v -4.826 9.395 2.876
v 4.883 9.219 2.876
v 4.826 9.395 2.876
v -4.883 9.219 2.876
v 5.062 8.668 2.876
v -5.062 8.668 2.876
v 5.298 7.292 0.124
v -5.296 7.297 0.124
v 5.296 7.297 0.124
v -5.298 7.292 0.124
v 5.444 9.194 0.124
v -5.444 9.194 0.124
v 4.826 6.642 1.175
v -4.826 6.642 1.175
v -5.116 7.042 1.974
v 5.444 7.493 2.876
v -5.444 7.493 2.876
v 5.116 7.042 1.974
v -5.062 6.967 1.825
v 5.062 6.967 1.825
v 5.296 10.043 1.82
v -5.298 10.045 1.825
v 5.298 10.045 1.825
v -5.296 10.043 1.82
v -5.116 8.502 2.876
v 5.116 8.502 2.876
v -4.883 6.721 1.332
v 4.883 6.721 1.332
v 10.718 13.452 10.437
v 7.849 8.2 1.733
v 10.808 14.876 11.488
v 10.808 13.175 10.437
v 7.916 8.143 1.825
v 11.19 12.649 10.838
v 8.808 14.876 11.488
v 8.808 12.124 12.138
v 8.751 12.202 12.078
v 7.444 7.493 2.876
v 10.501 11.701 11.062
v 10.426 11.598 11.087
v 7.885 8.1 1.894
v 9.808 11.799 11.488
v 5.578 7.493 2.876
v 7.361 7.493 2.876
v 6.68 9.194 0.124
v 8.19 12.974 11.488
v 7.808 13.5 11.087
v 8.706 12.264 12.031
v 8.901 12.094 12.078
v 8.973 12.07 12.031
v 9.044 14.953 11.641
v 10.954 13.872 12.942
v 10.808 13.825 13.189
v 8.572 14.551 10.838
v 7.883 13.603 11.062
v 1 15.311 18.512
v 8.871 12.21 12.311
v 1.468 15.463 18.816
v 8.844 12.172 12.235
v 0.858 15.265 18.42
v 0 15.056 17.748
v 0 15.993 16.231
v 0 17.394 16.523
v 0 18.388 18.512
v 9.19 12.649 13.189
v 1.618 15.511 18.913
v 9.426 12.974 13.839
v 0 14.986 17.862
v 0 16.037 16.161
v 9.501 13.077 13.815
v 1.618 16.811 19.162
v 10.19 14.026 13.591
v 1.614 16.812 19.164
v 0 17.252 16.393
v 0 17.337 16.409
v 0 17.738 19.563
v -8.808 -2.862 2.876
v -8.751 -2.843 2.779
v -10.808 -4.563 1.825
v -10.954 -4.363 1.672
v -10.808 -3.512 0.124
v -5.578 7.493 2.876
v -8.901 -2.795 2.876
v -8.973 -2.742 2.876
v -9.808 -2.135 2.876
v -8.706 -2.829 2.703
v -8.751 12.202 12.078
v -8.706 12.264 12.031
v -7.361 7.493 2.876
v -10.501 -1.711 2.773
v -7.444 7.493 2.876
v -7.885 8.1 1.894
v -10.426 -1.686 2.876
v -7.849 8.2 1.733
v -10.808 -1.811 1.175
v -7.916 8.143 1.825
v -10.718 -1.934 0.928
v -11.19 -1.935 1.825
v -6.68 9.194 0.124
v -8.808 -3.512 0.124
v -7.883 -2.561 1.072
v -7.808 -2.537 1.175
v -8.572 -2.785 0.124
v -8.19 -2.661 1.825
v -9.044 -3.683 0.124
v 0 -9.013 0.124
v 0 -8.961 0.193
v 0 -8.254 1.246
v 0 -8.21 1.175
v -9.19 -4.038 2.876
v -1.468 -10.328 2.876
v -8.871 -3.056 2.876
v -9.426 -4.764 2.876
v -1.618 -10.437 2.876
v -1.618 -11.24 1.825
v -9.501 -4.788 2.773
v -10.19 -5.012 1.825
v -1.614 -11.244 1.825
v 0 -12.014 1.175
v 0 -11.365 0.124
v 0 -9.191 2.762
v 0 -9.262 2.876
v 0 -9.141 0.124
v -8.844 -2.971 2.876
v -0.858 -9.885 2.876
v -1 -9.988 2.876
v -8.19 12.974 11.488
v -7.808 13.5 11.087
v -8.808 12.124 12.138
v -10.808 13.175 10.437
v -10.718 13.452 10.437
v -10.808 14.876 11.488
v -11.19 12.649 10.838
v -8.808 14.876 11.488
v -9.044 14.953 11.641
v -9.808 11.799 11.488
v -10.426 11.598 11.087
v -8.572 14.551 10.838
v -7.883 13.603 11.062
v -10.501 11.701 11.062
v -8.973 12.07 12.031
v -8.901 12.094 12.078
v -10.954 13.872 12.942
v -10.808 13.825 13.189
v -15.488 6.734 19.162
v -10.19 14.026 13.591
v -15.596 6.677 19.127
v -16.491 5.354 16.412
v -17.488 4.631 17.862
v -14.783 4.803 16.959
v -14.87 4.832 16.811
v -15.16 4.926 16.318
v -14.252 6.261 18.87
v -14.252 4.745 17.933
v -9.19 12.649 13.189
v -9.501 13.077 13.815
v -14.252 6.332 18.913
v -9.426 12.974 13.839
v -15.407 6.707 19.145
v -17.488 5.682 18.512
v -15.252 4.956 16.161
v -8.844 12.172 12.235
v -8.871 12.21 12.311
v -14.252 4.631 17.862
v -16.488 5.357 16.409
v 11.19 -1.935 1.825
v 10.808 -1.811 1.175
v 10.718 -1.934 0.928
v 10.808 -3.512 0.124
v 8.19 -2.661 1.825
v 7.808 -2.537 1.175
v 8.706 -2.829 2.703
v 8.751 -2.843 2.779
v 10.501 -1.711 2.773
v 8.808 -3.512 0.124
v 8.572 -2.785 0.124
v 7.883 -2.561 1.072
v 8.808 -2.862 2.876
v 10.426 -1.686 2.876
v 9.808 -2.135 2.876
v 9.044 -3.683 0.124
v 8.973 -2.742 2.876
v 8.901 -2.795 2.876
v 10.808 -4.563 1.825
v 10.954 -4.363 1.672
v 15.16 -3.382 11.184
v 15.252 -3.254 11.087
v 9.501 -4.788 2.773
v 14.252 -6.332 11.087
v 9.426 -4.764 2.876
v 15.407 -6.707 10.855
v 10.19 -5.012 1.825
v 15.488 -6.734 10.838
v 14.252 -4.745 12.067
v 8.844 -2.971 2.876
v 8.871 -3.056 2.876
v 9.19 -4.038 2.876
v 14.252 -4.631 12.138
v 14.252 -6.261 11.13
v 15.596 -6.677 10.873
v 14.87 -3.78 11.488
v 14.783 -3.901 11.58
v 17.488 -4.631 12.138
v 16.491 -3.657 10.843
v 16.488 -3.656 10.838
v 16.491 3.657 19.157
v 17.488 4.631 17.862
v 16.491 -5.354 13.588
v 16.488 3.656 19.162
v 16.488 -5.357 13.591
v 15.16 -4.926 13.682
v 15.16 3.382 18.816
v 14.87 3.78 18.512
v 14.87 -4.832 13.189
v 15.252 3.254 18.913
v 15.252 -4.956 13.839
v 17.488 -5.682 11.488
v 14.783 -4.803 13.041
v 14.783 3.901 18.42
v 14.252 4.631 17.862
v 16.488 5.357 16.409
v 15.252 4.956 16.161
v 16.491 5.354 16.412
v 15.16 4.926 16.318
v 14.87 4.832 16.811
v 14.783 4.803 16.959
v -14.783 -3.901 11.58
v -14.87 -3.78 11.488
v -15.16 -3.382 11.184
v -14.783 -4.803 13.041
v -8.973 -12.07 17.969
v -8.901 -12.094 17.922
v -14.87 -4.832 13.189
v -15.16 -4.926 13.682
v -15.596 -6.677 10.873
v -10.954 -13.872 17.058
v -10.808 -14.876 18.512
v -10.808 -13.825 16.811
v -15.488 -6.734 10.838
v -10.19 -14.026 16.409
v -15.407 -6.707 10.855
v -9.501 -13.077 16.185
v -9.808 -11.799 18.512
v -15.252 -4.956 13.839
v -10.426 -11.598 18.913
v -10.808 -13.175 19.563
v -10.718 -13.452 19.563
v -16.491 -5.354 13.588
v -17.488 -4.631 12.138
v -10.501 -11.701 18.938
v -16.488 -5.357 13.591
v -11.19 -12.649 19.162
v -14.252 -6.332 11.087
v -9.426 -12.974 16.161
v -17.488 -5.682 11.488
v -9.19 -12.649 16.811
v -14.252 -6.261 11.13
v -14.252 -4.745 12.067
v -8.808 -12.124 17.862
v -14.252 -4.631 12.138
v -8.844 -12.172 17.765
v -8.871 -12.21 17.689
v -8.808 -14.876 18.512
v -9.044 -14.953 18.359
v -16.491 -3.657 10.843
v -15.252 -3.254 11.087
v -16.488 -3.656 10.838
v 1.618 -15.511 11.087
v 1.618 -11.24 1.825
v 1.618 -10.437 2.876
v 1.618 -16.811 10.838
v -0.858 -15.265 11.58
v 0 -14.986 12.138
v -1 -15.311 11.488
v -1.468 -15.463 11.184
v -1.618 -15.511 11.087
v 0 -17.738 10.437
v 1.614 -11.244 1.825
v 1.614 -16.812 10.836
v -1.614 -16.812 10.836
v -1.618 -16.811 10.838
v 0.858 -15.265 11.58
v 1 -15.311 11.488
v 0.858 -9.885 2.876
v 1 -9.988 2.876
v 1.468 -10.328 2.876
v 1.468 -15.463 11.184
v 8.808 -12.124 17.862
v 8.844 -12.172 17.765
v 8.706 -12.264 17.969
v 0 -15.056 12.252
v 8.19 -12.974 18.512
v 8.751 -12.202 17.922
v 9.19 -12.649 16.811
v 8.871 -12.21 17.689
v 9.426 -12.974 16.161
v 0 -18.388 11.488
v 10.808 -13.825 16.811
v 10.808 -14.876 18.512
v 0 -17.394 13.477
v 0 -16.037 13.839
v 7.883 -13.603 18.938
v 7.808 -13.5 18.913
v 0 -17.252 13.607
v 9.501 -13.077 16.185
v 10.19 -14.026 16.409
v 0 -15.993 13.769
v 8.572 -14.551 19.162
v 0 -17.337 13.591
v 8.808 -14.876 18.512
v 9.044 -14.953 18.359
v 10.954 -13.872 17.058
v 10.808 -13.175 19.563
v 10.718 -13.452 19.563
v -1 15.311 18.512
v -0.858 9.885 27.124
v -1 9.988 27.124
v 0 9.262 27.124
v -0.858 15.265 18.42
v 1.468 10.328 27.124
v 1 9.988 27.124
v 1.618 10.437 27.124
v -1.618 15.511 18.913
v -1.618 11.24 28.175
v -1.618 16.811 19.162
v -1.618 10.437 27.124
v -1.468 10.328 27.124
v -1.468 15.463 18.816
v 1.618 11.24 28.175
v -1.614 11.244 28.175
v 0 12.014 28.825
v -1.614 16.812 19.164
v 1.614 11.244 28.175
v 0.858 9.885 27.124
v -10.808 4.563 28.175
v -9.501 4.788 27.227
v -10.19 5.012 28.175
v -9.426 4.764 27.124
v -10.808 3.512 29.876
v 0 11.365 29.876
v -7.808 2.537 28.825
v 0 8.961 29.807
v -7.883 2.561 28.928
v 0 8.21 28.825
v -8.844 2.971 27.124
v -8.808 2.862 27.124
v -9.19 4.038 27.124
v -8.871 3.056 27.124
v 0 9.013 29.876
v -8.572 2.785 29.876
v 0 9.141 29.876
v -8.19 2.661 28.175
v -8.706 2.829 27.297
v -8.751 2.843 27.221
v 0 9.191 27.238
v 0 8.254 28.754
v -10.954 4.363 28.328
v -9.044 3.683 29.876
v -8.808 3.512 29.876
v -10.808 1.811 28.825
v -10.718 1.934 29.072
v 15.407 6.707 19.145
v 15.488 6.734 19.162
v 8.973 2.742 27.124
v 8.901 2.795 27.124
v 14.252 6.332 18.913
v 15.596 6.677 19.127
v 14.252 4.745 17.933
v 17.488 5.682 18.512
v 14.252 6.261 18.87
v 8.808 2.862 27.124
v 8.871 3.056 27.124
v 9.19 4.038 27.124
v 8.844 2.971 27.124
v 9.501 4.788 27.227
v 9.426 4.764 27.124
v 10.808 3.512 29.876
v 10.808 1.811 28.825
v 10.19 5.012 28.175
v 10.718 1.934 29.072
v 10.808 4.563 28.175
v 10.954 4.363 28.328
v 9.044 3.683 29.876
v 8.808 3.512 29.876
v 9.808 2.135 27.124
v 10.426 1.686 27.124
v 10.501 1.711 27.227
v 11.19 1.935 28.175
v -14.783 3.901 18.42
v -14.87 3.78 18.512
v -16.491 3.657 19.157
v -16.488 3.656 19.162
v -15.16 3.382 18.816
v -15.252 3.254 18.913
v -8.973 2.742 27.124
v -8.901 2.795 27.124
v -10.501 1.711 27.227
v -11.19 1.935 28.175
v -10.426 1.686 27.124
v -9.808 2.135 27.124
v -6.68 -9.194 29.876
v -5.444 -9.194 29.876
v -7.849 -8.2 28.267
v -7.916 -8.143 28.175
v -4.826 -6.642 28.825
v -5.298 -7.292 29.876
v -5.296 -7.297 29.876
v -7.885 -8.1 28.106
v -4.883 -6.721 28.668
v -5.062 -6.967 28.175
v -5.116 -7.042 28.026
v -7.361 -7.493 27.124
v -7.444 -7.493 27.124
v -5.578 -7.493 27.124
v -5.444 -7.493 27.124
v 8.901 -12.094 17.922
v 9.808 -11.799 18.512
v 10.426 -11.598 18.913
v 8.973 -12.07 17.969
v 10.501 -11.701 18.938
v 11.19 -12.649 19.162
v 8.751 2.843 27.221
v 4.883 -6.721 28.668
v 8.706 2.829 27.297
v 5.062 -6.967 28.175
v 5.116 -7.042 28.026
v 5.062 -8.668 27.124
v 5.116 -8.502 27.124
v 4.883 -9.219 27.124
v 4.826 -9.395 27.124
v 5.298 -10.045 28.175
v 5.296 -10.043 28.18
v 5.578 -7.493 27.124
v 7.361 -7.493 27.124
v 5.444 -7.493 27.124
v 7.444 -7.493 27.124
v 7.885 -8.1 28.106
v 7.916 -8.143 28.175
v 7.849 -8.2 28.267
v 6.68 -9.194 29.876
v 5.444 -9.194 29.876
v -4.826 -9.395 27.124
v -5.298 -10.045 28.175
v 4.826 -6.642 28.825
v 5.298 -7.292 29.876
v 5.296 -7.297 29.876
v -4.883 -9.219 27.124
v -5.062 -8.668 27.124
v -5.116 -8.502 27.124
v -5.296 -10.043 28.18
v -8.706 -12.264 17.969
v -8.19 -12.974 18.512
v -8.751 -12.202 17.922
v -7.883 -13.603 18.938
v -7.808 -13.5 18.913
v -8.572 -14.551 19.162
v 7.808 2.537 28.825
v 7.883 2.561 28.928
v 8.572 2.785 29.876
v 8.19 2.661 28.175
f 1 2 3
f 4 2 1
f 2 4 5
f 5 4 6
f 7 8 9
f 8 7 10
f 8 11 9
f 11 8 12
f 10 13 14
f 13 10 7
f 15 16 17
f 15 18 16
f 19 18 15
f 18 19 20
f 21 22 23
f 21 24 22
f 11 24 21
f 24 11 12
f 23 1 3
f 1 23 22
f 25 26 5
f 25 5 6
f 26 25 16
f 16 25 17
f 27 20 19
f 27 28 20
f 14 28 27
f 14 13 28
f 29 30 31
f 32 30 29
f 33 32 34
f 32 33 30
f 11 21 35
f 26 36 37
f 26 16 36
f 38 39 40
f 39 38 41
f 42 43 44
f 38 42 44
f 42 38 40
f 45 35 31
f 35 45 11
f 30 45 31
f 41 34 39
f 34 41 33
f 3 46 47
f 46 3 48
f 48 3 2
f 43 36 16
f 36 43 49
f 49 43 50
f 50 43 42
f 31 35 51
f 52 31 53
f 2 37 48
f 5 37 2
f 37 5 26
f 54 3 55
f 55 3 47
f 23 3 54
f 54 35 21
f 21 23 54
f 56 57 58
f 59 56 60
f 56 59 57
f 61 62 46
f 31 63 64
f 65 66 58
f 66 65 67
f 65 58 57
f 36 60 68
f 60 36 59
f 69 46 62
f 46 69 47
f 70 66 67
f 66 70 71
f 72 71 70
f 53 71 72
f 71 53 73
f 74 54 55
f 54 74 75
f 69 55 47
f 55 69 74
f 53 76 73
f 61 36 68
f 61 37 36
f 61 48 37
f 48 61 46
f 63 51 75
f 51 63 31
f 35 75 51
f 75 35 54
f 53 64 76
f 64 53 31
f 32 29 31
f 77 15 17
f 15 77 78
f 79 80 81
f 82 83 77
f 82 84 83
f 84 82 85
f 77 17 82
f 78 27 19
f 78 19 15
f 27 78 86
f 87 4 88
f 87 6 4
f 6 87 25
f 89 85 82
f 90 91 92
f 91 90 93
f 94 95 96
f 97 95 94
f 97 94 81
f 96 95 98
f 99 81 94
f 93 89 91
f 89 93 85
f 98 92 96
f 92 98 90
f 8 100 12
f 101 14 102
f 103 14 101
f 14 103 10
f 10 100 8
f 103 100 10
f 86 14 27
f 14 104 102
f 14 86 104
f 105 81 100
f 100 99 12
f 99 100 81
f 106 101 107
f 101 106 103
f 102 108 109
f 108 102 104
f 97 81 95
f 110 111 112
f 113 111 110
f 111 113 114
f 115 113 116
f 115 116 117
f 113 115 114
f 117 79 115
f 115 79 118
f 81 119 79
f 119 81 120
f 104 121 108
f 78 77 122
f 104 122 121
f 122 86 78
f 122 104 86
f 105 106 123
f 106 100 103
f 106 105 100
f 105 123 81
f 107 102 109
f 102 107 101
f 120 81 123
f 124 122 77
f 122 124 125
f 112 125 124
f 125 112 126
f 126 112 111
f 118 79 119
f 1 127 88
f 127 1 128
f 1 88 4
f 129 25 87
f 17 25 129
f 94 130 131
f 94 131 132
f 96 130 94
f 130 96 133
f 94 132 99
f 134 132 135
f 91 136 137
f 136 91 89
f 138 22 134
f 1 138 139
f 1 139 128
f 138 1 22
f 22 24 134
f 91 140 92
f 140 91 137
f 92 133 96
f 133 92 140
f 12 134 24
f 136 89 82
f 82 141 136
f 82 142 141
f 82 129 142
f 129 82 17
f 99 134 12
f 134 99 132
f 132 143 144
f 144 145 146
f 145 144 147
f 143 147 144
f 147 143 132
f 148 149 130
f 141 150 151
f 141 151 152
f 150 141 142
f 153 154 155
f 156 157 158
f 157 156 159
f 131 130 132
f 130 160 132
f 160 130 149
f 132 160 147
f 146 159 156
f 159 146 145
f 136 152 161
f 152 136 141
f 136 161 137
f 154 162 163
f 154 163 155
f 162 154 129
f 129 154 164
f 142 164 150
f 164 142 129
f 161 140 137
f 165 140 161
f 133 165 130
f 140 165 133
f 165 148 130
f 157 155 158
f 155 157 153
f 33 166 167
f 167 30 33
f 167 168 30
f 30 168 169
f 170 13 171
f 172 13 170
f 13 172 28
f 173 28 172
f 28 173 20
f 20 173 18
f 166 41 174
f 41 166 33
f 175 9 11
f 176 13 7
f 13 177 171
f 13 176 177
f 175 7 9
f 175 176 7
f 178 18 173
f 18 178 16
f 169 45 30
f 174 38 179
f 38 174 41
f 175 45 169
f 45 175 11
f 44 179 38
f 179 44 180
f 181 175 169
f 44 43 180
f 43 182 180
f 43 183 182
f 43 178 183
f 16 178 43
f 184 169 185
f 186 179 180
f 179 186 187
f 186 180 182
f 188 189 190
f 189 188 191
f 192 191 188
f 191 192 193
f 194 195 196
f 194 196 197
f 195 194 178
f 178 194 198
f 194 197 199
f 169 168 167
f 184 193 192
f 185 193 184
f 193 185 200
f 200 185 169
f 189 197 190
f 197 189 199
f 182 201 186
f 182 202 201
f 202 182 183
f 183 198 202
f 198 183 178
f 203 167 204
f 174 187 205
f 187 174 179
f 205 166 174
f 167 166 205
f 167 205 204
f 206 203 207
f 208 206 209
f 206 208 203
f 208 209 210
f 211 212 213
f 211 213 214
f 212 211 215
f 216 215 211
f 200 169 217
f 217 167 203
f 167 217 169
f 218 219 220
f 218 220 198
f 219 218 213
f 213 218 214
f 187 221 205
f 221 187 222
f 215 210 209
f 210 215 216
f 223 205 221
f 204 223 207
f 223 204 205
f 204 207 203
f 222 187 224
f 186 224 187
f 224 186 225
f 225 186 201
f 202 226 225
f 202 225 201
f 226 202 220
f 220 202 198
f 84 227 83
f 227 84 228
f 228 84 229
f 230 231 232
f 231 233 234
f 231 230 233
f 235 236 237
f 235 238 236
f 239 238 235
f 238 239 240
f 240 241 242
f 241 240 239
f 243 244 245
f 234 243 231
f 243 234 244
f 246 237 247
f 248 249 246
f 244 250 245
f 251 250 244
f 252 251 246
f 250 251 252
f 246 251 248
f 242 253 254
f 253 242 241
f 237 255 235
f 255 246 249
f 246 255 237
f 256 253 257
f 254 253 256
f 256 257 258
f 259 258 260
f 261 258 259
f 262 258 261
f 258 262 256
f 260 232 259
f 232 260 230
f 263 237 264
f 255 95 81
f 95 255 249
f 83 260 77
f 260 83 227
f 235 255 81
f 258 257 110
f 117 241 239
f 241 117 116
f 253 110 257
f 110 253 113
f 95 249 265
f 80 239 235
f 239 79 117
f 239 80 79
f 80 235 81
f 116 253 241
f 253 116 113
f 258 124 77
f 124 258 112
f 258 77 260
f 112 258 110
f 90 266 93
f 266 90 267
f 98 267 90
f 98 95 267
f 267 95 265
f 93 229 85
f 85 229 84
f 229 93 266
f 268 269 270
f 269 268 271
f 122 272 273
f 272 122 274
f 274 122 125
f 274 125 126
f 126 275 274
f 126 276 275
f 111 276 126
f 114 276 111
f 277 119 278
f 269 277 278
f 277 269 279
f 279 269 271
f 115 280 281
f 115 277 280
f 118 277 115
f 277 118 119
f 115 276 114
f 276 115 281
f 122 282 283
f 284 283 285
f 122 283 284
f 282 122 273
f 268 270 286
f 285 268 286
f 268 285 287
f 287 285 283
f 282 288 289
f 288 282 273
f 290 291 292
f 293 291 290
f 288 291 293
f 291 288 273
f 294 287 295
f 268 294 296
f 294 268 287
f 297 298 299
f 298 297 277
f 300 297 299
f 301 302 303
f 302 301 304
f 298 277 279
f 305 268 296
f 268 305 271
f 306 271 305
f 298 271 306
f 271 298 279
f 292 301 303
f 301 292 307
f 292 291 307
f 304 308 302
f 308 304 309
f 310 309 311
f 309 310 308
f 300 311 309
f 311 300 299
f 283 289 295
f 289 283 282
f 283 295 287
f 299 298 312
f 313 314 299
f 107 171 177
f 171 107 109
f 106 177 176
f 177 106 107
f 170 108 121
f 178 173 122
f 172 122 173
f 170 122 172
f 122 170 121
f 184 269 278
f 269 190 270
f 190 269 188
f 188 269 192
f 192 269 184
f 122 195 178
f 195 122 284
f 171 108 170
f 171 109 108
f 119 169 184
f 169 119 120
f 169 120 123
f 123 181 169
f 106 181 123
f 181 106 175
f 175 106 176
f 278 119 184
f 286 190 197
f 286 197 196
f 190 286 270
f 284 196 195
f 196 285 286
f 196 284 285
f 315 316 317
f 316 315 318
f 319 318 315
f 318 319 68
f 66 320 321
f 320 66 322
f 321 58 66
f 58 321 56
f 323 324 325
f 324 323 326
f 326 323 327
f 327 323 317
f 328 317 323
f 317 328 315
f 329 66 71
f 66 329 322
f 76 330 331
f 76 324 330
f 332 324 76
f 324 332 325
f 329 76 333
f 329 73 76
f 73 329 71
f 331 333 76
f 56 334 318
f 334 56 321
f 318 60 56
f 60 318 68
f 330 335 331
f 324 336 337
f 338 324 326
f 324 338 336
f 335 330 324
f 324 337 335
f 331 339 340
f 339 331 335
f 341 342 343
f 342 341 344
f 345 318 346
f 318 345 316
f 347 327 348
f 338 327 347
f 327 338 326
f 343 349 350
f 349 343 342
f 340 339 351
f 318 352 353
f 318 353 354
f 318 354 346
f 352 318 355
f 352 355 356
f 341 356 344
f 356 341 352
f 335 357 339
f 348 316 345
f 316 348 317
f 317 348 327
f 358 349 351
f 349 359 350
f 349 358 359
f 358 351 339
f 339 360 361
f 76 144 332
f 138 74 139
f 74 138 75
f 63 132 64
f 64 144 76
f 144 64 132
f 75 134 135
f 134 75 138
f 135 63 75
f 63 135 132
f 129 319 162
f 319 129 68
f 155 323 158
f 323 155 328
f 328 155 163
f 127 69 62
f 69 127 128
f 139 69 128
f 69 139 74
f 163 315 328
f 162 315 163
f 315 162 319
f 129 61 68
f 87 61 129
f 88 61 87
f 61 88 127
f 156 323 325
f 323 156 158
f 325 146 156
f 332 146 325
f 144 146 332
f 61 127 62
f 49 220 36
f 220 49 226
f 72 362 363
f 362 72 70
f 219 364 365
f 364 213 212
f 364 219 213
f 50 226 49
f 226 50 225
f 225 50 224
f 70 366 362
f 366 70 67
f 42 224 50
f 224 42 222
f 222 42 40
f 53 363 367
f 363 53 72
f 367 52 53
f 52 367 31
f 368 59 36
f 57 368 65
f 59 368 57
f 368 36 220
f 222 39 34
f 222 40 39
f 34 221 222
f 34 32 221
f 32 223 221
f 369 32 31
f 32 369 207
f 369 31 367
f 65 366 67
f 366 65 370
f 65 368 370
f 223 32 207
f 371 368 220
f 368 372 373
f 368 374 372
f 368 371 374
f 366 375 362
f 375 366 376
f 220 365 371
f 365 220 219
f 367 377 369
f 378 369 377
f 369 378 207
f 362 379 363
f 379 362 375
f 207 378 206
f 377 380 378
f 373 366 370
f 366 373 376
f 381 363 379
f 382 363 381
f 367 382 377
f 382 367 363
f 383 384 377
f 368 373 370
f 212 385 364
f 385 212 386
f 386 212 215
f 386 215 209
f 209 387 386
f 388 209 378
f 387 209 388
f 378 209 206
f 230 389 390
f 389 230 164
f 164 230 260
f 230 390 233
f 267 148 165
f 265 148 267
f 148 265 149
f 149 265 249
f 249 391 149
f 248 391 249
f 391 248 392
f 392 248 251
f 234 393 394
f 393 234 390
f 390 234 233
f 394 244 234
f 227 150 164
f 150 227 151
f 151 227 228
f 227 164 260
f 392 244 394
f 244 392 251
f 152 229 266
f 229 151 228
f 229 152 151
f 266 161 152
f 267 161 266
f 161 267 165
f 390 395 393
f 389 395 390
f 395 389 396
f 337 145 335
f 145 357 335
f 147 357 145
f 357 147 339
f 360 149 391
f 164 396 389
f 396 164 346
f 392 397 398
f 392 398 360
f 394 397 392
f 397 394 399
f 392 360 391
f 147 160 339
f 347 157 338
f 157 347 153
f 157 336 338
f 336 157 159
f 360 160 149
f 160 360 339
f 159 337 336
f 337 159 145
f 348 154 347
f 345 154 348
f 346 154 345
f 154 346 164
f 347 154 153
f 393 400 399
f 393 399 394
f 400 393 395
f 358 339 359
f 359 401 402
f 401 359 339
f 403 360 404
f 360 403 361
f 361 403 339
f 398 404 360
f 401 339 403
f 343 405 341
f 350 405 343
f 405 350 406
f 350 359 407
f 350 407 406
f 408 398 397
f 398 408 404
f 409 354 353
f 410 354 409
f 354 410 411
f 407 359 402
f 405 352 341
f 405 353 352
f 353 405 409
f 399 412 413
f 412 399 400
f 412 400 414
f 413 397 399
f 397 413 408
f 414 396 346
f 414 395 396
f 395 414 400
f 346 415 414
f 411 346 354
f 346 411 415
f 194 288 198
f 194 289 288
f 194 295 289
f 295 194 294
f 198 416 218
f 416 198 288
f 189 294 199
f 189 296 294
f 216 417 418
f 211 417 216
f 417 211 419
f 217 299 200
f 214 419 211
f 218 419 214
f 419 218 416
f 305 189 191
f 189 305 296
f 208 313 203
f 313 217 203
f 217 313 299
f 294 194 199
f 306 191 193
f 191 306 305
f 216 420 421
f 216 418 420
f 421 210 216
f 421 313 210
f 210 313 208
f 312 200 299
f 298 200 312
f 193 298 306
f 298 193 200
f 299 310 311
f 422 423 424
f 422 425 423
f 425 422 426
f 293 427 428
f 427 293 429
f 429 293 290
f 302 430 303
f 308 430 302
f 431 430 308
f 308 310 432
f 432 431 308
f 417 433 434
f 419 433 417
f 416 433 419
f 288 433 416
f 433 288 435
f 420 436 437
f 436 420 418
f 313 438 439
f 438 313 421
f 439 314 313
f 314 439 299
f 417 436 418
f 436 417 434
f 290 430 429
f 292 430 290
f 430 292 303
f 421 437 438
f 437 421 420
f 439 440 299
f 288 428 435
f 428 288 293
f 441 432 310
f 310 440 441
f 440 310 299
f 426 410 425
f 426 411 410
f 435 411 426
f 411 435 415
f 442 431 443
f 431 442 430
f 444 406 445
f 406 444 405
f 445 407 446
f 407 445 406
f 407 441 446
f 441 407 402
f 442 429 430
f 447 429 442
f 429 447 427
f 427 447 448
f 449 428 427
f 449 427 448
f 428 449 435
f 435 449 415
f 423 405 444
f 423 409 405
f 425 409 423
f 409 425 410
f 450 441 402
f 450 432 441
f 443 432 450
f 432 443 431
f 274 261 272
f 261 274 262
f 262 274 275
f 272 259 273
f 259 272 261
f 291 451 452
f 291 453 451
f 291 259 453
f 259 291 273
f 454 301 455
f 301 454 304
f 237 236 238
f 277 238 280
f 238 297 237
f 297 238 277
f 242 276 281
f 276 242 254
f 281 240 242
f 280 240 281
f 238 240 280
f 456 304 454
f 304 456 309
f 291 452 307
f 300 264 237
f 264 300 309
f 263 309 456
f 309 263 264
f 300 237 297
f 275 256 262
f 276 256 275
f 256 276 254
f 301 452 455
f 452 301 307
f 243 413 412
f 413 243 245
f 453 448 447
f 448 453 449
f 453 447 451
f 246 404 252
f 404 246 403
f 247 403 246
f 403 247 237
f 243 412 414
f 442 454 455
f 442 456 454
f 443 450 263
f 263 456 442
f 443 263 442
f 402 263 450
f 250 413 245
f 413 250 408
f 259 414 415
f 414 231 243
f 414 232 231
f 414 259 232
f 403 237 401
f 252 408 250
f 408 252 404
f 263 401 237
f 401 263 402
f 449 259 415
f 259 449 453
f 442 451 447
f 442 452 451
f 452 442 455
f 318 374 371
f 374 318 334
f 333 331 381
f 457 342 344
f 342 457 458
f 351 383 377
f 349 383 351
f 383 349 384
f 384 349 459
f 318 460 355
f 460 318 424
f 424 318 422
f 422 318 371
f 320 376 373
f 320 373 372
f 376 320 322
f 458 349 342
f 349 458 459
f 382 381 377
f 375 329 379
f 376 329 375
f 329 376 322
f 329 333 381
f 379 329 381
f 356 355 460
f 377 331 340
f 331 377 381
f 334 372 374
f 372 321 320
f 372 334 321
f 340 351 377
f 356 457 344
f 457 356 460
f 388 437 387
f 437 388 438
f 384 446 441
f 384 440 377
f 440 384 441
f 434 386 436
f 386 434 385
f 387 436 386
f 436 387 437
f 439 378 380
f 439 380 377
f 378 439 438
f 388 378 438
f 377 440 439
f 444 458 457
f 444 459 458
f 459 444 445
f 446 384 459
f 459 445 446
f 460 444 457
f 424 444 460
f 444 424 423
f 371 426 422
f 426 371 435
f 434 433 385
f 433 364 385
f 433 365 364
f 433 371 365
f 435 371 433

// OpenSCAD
// shape height
sh = 30;
// border width
bw = 3;

translate([0, 0, sh / 2])
    dface_rotate()
        dodecahedron1();

// ------------ dodecahedron ------------

phi = (sqrt(5) + 1) / 2;

// dodecahedron vertices

dvert = [
    [-1/phi, 0, -phi], // 0
    [1/phi, 0, -phi], // 1
    [-1, -1, -1], // 2
    [-1, 1, -1], // 3
    [1, -1, -1], // 4
    [1, 1, -1], // 5
    [0, -phi, -1/phi], // 6
    [0, phi, -1/phi], // 7
    [-phi, -1/phi, 0], // 8
    [-phi, 1/phi, 0], // 9
    [phi, -1/phi, 0], // 10
    [phi, 1/phi, 0], // 11
    [0, -phi, 1/phi], // 12
    [0, phi, 1/phi], // 13
    [-1, -1, 1], // 14
    [-1, 1, 1], // 15
    [1, -1, 1], // 16
    [1, 1, 1], // 17
    [-1/phi, 0, phi], // 18
    [1/phi, 0, phi] // 19    
];

dface = [
    [0, 1, 5, 7, 3],
    [1, 0, 2, 6, 4],
    [0, 3, 9, 8, 2],
    [1, 4, 10, 11, 5],
    [8, 14, 12, 6, 2],
    [6, 12, 16, 10, 4],
    [7, 13, 15, 9, 3],
    [13, 7, 5, 11, 17],
    [8, 9, 15, 18, 14],
    [11, 10, 16, 19, 17],
    [18, 19, 16, 12, 14],
    [19, 18, 15, 13, 17]
];

df0c = (dvert[1] + dvert[0] + dvert[2] + dvert[6] + dvert[4]) / 5;
dfr = norm(df0c);
dfa = atan(df0c.y / df0c.z);

module dodecahedron1() {
    s = (sh - bw) / 2 / dfr;
    for (f = dface) {
        for (i = [0:4]) {
            j = (i + 1) % 5;
            p = f[i];
            q = f[j];
            if (p < q) {
                hull() {
                    translate(dvert[p] * s) dodecahedron0();
                    translate(dvert[q] * s) dodecahedron0();
                }                
            }
        }
    }   
}

module dodecahedron0() {
    polyhedron(dvert, dface);
}

module dface_rotate() {
    rotate([dfa, 0, 0]) children();
}
